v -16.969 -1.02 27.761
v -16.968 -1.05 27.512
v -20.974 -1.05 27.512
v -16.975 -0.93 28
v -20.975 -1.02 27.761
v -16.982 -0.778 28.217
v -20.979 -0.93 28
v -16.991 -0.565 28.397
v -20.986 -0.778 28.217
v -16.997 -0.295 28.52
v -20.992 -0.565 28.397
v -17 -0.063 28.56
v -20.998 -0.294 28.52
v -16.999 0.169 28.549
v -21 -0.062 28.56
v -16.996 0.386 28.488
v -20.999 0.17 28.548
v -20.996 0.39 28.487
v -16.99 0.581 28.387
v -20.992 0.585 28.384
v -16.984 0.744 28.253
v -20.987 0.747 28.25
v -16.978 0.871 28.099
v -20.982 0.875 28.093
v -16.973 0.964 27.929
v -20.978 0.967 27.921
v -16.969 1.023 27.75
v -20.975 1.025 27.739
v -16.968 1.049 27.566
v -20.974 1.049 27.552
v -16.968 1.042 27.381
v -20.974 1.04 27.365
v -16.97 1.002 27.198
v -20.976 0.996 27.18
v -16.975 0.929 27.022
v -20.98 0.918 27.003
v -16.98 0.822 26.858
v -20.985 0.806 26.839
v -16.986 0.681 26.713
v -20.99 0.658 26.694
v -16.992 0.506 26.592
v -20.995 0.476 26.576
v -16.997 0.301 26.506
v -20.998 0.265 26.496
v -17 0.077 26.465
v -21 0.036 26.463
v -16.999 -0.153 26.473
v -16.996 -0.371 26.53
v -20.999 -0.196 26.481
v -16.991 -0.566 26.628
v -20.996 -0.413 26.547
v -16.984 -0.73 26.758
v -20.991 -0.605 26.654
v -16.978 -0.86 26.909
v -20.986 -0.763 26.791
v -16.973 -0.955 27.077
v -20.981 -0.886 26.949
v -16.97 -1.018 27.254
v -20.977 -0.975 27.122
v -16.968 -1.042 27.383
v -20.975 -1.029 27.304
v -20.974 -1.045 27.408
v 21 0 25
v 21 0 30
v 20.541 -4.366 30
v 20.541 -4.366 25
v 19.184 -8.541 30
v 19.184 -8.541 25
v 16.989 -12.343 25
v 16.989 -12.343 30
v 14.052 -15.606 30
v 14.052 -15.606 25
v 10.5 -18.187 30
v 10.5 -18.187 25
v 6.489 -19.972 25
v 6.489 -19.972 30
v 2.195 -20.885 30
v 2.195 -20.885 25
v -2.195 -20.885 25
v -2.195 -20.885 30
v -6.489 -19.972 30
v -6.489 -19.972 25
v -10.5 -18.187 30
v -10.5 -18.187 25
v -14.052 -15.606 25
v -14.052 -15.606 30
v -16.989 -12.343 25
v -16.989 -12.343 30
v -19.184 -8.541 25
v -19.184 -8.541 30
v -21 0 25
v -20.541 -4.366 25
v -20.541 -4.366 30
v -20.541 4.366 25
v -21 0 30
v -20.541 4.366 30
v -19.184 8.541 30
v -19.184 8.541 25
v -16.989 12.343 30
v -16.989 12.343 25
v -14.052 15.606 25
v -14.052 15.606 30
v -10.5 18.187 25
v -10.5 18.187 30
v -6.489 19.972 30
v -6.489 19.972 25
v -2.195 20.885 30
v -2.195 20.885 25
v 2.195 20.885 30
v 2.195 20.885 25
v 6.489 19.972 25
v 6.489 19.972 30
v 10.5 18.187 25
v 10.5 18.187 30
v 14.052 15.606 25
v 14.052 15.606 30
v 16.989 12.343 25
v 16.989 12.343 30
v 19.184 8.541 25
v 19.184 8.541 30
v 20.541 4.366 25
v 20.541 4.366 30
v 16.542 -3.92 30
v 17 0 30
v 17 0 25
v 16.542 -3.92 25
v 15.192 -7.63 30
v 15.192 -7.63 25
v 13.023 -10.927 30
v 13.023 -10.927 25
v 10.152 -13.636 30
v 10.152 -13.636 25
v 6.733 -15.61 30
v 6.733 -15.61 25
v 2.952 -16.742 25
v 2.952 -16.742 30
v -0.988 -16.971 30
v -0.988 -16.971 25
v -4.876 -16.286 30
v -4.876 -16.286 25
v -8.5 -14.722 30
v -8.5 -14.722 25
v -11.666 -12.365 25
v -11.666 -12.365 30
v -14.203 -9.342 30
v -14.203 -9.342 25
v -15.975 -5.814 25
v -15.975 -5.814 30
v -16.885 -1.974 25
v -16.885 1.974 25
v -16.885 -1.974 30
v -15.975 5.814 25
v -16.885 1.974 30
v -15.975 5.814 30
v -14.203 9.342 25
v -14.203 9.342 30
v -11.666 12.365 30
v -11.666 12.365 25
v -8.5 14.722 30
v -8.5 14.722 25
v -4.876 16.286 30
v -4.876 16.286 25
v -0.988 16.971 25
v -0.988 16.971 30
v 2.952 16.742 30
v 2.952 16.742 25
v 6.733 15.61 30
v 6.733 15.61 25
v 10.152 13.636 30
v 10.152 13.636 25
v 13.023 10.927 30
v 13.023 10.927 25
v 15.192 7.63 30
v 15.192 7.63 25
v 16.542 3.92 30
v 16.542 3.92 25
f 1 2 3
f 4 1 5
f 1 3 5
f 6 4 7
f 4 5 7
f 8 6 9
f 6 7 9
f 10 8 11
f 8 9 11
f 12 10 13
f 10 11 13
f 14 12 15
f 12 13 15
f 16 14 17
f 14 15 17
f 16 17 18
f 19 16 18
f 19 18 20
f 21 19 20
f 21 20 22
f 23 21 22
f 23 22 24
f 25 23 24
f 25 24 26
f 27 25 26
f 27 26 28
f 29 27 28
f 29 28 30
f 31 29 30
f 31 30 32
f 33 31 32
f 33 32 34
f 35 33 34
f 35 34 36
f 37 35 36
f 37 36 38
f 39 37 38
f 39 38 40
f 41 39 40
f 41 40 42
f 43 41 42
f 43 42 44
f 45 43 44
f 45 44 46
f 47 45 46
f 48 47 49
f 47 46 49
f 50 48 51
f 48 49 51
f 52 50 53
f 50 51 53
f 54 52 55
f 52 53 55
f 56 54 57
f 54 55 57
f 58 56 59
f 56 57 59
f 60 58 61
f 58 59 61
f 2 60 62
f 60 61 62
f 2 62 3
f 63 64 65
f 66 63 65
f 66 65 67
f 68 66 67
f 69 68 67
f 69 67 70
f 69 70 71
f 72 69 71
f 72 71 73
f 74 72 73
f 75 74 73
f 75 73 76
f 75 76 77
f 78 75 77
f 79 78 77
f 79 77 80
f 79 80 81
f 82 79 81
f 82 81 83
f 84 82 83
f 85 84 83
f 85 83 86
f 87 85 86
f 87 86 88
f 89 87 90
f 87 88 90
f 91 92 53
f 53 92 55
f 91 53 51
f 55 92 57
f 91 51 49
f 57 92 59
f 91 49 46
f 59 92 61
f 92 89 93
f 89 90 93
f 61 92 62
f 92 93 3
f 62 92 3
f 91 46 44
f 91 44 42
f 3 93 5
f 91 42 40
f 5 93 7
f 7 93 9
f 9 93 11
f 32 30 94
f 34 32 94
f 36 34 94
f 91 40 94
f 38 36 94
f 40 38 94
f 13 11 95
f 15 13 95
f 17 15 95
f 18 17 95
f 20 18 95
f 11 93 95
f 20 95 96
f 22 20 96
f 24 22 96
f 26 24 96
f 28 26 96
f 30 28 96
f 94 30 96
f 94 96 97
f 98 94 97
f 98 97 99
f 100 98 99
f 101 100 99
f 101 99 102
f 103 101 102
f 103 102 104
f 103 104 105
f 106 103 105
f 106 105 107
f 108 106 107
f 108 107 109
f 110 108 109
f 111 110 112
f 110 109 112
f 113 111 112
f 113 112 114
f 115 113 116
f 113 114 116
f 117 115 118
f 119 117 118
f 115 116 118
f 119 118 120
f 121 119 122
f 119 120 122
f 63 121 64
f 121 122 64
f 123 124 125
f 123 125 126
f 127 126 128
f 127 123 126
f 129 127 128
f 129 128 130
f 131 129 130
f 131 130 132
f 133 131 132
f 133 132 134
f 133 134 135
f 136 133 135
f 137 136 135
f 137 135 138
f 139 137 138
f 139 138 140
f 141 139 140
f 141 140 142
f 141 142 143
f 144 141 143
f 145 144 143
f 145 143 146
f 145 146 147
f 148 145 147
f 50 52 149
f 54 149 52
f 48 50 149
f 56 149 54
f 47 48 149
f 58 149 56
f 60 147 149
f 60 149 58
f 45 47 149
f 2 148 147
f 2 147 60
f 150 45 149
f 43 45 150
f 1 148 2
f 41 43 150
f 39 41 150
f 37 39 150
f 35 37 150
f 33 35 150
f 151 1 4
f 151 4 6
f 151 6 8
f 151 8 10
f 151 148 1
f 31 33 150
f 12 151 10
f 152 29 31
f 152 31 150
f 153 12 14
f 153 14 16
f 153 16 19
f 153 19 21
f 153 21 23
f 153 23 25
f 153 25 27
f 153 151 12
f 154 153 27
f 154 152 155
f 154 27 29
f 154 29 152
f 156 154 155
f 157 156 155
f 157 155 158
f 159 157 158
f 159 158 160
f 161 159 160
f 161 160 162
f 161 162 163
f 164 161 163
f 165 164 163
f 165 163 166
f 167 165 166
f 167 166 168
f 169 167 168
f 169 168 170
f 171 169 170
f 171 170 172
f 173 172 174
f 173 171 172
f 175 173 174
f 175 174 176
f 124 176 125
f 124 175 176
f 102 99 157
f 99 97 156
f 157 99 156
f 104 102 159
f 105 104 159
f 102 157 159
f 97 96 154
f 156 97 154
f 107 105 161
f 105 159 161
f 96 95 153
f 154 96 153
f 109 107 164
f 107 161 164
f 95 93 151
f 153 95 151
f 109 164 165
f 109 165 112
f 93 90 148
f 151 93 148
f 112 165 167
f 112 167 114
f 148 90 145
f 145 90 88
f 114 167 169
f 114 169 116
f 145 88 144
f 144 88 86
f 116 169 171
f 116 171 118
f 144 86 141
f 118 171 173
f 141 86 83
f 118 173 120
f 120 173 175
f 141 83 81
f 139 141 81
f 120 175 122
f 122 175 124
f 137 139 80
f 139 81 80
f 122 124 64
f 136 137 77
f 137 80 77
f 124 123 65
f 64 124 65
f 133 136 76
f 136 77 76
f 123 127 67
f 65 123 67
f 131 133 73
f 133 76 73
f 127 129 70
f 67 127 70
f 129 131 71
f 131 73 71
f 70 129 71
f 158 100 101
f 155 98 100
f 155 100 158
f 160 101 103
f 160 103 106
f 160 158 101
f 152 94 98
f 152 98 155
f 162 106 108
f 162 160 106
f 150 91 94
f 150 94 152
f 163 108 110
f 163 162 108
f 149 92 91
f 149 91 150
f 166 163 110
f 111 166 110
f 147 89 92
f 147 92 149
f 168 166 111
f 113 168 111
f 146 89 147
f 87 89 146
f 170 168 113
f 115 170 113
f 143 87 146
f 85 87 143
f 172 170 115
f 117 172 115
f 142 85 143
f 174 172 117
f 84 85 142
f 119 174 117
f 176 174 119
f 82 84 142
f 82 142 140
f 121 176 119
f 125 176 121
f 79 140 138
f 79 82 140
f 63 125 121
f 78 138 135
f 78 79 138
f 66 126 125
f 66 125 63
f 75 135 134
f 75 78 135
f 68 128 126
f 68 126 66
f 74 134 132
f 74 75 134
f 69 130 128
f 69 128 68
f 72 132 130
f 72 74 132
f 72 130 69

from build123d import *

# Parameters (mm, degrees)
SKETCH007_R      = 1.05
EXTRUDE008_DEPTH = 30
SKETCH003_R      = 21
SKETCH003_R_2    = 17
EXTRUDE003_DEPTH = 5


with BuildPart() as extrude008:
    # Sketch007 → Extrude008 (new body)
    with BuildSketch(Plane(origin=(-30.396078, 0, 0), x_dir=(0, -1, 0), z_dir=(-1, 0, 0))):
        with Locations((0, 27.512153)):
            Circle(SKETCH007_R)
    extrude(amount=-EXTRUDE008_DEPTH)


with BuildPart() as cut002:
    # Sketch003 (on Face321 of involutegear) → Extrude003 (new body)
    with BuildSketch(Plane(origin=(0, 0, 30), x_dir=(1, 0, 0), z_dir=(0, 0, -1))):
        Circle(SKETCH003_R)
        Circle(SKETCH003_R_2, mode=Mode.SUBTRACT)
    extrude(amount=EXTRUDE003_DEPTH)

    # Cut002: cut Extrude008
    add(extrude008.part, mode=Mode.SUBTRACT)


solid = cut002.part
